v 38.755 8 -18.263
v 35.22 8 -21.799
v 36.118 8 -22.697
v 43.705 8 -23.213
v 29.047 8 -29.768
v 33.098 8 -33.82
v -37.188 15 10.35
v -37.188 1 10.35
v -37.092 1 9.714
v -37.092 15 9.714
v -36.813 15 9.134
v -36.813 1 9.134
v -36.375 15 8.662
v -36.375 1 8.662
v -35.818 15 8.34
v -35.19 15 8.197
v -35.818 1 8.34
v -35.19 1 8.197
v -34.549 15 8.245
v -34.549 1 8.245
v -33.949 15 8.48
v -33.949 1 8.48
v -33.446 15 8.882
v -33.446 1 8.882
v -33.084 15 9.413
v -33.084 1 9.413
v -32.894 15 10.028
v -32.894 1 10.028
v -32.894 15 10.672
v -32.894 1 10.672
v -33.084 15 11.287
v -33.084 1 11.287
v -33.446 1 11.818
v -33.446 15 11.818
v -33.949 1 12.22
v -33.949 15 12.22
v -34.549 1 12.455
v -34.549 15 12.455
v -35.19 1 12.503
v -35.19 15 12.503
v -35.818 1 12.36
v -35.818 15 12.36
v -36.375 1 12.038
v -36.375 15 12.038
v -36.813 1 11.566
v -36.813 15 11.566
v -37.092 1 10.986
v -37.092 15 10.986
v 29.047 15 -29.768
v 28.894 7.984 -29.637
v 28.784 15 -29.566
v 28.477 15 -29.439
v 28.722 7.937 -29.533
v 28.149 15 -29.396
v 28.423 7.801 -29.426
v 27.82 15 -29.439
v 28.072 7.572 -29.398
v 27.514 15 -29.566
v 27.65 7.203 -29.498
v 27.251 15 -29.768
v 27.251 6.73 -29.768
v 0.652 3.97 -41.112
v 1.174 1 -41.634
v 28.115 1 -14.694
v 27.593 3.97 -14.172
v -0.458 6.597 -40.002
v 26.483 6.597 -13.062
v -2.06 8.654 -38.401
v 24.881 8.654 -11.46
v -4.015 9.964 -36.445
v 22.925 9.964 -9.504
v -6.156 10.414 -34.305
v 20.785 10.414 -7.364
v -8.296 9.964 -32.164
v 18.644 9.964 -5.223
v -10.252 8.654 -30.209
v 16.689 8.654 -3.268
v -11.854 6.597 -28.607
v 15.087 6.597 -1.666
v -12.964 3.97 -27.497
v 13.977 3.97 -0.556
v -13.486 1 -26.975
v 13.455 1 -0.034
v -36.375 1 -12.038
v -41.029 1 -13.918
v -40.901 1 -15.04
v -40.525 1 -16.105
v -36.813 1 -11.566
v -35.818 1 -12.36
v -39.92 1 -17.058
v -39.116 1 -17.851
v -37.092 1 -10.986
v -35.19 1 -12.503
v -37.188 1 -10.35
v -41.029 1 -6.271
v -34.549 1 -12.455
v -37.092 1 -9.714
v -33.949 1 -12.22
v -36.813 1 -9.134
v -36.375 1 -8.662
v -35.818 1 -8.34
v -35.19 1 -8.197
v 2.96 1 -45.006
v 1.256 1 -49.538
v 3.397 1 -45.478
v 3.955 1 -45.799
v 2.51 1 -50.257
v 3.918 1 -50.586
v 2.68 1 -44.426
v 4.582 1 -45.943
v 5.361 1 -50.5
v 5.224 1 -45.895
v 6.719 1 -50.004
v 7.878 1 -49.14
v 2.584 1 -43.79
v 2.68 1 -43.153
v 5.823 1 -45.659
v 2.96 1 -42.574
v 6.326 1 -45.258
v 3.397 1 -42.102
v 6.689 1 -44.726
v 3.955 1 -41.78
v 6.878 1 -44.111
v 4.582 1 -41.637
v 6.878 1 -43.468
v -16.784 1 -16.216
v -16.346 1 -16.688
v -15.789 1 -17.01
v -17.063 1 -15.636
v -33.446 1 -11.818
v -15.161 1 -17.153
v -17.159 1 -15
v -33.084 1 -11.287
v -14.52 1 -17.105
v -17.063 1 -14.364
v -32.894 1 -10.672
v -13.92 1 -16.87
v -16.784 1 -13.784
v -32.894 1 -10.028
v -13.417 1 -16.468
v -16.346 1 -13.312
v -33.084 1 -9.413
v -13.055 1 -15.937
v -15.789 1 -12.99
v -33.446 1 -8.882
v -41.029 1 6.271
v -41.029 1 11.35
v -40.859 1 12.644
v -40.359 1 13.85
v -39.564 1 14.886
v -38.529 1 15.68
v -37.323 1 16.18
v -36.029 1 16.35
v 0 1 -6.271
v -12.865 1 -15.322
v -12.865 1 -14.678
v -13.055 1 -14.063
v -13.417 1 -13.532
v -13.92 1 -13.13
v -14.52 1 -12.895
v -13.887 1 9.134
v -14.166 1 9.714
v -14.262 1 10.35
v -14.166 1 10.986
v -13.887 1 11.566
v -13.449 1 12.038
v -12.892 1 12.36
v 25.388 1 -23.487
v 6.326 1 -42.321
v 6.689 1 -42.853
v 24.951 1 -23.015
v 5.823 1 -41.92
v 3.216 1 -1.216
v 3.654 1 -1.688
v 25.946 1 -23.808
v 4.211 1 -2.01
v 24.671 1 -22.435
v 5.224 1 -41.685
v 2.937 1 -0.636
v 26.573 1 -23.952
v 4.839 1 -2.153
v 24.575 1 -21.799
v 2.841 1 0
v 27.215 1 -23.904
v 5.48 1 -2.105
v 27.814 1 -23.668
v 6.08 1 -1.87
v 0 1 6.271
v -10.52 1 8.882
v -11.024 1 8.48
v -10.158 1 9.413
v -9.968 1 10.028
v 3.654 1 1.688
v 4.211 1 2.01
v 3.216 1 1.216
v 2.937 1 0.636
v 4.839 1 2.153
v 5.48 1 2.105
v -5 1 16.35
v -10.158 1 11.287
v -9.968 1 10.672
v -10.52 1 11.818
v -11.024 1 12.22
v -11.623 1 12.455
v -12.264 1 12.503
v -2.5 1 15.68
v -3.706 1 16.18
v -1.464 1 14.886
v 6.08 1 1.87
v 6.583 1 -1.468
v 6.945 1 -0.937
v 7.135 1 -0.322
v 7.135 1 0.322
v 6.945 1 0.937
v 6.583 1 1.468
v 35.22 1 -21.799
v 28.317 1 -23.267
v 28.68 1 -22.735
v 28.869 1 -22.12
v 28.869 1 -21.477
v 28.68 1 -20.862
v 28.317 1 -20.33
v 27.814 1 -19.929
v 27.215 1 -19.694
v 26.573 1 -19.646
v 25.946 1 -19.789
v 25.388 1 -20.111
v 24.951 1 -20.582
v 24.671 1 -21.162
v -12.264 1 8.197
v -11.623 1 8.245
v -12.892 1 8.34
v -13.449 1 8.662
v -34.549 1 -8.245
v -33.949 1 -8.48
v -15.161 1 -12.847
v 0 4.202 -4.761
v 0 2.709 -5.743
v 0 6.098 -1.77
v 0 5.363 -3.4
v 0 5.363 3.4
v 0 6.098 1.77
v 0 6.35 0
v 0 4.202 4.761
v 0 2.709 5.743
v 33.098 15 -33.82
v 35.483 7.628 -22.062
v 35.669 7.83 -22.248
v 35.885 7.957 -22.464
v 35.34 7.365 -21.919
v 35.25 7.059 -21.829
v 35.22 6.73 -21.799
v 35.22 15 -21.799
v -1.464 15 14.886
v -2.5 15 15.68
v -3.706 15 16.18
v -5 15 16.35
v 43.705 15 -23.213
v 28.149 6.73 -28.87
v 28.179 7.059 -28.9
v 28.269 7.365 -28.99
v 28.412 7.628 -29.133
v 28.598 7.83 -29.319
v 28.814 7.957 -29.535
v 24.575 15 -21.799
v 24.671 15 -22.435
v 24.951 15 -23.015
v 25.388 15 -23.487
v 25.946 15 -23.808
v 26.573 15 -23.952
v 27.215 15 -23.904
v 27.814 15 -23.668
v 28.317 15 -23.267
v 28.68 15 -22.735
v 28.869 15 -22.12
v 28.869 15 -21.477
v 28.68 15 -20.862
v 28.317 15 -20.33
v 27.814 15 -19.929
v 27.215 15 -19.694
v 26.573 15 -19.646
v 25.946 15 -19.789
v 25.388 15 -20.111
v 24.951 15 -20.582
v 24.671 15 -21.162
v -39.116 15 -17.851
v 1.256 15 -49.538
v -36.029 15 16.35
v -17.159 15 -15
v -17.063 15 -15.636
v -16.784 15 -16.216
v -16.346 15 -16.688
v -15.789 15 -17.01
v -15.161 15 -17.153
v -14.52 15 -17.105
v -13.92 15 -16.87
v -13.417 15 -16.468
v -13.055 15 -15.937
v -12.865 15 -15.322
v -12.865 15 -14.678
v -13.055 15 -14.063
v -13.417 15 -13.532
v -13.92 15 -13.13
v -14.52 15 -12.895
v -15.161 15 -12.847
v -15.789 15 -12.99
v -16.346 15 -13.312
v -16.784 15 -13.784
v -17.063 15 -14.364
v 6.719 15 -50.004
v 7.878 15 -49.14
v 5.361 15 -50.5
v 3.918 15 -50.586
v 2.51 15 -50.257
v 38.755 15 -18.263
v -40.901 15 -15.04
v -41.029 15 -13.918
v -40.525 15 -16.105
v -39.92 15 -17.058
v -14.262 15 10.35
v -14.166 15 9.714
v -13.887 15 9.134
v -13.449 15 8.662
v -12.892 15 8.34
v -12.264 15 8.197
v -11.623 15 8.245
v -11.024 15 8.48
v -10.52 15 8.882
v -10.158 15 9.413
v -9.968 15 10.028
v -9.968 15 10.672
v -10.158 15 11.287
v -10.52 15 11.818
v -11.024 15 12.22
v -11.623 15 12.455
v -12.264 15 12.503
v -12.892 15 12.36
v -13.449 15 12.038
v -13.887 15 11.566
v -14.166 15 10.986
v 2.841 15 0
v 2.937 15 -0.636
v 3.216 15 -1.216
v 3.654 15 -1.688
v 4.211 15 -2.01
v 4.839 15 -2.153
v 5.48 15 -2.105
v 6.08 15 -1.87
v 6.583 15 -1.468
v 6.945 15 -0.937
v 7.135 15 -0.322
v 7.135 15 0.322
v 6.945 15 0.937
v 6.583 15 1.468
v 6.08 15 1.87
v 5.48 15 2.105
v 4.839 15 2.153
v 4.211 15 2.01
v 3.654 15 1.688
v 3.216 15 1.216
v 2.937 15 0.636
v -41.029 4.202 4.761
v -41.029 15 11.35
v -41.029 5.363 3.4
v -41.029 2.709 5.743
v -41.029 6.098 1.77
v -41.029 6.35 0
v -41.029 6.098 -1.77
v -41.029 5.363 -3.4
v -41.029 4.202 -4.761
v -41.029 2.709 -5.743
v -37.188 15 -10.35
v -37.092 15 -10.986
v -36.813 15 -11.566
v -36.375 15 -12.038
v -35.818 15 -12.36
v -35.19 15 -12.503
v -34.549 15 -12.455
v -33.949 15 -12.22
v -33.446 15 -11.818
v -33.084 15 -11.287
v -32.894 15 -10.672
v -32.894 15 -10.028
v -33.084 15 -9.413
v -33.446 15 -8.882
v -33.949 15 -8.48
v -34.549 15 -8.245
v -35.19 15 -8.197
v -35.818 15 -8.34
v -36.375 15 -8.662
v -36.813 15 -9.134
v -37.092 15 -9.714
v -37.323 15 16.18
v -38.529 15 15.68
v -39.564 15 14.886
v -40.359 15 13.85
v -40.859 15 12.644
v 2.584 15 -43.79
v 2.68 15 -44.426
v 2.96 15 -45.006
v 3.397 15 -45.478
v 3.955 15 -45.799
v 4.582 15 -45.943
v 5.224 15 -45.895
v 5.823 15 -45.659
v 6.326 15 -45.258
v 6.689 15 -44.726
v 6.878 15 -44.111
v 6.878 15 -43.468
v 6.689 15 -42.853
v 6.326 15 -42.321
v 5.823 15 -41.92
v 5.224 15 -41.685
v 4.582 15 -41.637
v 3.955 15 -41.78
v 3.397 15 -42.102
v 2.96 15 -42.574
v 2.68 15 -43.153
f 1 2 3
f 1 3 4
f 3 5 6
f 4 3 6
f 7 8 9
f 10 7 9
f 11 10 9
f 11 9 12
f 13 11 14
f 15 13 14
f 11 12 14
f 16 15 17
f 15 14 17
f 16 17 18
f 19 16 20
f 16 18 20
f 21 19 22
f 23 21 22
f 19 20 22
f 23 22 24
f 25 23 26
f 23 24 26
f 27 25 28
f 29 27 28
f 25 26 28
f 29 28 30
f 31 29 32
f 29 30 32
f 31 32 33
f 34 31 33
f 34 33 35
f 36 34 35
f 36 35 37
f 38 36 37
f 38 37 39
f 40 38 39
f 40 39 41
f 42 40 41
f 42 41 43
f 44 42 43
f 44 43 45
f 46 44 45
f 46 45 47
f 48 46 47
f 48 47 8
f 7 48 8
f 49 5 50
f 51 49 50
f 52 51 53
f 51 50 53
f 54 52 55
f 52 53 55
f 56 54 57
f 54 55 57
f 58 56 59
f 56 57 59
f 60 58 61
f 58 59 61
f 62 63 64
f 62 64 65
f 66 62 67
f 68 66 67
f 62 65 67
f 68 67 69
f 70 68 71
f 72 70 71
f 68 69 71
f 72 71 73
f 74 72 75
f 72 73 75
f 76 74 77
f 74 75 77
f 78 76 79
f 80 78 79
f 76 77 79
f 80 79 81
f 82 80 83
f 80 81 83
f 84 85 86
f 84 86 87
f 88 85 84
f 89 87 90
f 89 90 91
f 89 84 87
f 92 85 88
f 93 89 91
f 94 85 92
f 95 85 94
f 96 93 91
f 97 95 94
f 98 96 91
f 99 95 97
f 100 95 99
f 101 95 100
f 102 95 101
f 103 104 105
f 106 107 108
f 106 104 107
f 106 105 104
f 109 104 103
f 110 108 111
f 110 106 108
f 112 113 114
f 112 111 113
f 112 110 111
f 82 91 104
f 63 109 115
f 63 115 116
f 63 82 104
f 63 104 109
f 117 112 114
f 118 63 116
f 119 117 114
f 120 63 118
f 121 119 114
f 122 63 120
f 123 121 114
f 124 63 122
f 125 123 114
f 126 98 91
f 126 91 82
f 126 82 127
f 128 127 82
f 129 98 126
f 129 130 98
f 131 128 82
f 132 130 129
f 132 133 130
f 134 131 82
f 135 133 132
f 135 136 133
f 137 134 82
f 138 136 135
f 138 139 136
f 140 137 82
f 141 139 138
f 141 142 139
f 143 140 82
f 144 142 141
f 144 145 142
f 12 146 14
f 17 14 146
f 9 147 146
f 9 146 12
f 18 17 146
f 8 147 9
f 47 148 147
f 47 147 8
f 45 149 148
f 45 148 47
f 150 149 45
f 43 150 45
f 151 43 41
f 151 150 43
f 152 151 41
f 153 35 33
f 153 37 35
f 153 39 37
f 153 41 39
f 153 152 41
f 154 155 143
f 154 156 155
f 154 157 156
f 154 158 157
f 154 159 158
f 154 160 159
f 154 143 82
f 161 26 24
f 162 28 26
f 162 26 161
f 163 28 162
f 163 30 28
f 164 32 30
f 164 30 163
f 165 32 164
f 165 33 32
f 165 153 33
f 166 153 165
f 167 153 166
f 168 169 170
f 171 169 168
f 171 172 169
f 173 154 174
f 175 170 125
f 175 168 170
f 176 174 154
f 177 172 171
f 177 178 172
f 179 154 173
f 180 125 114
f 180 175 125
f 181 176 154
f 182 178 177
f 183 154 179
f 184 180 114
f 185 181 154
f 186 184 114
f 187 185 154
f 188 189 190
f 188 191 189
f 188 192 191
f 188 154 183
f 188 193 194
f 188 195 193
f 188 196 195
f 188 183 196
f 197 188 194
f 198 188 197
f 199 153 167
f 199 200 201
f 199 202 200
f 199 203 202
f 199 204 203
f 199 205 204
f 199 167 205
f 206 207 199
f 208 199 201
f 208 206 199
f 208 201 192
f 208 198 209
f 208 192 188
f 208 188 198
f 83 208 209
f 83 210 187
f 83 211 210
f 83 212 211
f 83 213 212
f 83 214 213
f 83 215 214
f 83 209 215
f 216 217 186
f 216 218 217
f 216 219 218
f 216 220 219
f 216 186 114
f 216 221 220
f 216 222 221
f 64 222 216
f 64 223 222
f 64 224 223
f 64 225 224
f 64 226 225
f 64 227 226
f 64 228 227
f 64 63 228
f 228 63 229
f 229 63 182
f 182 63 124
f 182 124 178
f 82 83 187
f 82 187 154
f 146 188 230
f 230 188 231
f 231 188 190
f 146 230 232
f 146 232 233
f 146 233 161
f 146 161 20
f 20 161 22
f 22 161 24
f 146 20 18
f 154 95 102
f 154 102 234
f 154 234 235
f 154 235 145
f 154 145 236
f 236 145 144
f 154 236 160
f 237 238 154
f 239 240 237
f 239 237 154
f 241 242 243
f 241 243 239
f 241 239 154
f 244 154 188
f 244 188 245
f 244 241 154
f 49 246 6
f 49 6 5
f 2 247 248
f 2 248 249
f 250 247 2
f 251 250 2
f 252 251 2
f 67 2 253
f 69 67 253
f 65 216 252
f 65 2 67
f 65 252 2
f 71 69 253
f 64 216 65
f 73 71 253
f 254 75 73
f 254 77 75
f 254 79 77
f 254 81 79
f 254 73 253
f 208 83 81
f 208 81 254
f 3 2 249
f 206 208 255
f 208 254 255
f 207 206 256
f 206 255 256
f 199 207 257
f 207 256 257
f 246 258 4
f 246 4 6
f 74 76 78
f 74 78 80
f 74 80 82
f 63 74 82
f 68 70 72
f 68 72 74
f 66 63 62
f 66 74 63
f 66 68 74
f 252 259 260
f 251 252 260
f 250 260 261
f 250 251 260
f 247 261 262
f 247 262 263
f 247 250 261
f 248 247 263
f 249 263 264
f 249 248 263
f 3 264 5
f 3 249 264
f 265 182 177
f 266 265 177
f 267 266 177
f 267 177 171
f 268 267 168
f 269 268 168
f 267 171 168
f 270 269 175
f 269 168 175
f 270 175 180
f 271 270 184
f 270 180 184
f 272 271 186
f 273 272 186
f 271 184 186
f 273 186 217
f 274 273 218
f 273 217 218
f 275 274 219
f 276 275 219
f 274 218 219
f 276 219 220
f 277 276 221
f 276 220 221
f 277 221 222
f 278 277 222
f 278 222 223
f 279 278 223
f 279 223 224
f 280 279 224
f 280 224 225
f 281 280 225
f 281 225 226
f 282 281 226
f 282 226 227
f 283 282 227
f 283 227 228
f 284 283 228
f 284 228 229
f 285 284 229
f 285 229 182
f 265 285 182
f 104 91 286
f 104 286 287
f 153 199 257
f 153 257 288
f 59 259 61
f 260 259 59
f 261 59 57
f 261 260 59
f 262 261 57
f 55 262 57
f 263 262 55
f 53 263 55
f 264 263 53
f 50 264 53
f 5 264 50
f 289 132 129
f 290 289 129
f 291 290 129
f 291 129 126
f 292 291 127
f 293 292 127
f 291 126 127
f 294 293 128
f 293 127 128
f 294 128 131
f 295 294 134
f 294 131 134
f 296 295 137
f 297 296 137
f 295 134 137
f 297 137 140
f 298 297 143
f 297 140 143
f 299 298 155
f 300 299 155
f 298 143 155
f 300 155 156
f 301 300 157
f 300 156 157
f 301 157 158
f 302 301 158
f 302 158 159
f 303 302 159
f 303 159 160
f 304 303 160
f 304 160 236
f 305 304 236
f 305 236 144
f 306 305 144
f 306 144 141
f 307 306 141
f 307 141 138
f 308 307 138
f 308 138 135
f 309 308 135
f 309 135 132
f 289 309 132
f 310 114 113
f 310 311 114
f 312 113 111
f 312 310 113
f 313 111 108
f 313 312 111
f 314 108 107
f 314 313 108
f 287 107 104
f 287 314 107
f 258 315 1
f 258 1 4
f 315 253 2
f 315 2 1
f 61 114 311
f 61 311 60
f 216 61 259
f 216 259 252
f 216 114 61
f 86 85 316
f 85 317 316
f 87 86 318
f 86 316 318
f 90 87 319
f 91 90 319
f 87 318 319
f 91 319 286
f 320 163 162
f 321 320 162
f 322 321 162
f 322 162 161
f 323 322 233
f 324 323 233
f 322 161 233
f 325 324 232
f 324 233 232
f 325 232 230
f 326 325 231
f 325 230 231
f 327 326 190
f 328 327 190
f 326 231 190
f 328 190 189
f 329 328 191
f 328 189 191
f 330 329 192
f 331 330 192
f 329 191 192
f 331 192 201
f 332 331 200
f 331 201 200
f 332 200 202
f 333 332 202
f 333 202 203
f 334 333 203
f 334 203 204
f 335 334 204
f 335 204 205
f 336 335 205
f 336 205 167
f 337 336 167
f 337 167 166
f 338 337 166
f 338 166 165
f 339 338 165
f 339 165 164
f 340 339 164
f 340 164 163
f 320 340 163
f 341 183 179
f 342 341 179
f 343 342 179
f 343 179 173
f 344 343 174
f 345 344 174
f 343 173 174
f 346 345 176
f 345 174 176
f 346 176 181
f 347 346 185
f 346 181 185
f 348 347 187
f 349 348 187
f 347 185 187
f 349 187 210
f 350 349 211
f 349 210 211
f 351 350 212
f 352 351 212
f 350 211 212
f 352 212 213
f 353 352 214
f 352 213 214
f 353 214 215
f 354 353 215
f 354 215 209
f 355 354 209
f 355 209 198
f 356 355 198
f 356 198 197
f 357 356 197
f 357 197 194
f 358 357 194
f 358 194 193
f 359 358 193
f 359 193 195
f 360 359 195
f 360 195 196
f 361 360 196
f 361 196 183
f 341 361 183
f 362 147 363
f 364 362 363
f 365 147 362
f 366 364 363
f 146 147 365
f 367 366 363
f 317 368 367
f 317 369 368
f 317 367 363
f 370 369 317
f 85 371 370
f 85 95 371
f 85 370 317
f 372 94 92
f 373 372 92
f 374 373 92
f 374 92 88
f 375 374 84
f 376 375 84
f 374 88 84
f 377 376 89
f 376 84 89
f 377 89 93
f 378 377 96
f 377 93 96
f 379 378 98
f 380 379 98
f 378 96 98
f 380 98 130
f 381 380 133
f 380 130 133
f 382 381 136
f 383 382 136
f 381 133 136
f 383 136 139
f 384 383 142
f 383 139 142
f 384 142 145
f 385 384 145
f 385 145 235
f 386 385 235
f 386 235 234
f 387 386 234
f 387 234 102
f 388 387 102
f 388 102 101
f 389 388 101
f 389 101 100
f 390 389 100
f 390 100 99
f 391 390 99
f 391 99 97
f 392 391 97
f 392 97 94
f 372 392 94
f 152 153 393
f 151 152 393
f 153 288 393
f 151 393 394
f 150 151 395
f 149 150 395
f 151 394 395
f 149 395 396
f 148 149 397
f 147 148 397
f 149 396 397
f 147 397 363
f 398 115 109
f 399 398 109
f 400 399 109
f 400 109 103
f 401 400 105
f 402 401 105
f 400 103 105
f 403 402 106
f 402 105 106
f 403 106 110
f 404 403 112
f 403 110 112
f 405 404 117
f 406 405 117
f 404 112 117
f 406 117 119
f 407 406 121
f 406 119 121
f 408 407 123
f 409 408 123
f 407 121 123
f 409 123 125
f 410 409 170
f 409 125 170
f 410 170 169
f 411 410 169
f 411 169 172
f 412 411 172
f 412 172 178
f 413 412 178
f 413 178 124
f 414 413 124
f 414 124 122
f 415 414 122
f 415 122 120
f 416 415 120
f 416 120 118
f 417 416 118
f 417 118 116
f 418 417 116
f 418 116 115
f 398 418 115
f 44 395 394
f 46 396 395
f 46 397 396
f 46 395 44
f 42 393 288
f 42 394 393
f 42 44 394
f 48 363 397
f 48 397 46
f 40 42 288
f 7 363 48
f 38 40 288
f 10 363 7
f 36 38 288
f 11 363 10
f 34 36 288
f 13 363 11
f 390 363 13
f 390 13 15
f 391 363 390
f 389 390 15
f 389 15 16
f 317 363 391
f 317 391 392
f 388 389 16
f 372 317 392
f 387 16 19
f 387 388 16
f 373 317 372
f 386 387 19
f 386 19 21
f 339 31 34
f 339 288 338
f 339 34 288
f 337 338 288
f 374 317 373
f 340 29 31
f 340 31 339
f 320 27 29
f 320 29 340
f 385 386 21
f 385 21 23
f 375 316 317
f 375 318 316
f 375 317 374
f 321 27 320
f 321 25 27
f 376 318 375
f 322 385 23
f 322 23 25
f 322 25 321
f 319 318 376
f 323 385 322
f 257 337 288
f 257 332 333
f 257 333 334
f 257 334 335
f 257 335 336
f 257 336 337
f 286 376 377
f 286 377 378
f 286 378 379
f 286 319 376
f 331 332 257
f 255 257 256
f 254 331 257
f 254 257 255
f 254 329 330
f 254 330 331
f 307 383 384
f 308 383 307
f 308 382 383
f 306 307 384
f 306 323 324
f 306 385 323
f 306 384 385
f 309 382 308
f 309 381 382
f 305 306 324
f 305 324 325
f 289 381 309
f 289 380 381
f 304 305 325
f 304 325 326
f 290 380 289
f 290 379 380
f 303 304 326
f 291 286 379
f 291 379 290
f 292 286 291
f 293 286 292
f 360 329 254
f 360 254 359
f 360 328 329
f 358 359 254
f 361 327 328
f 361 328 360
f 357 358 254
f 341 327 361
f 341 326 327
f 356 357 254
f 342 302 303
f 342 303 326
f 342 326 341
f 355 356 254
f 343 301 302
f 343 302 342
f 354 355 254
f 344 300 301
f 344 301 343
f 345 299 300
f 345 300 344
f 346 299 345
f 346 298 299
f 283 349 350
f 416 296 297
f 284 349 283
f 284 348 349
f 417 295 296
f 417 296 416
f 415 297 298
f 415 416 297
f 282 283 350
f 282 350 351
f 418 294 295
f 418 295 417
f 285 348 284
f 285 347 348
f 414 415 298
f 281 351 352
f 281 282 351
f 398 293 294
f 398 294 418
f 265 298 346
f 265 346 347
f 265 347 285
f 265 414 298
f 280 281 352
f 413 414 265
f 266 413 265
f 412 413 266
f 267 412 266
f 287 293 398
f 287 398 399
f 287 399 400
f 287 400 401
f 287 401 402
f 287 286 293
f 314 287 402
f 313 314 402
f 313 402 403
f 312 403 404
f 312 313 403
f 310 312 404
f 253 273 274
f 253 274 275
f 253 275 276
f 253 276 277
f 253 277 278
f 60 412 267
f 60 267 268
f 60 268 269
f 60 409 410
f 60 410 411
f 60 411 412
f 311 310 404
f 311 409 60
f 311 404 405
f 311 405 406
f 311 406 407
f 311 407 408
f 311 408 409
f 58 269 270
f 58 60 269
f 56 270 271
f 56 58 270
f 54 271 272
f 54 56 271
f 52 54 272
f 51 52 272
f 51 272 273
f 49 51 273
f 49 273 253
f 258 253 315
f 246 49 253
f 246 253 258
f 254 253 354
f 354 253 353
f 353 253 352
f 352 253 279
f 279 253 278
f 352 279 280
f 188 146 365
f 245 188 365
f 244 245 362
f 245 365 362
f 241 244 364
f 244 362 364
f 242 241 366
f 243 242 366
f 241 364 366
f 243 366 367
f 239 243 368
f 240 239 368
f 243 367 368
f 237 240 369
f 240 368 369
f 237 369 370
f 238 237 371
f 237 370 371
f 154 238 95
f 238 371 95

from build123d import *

# Parameters (mm, degrees)
EXTRUDE_1_DEPTH        = 14
EXTRUDE_2_DEPTH        = 7
CUT_EXTRUDE_1_DEPTH    = 38.1
CUT_EXTRUDE_2_DEPTH    = 41.028932188
HOLE_WIZARD_M4_1_D     = 4.318
HOLE_WIZARD_M4_1_DEPTH = 14
FILLET_1_R             = 5
FILLET_3_R             = 1.27
FILLET_4_R             = 1.27


with BuildPart() as part:
    # 草图1 → 凸台-拉伸1 (new body)
    with BuildSketch(Plane.XZ.offset(-1)):
        Polygon((4.743453393, -52.27499012), (35.219755662, -21.79868785), (-2.928932188, 16.35), (-41.028932188, 16.35), (-41.028932188, -16.35), align=None)
    extrude(amount=-EXTRUDE_1_DEPTH)

    # 草图2 → 凸台-拉伸2 (add)
    with BuildSketch(Plane(origin=(0, 15, 0), x_dir=(1, 0, 0), z_dir=(0, 1, 0))):
        Polygon((35.219755662, 21.79868785), (38.755289568, 18.263153944), (43.705037037, 23.212901413), (33.098435319, 33.819503131), (28.14868785, 28.869755662), align=None)
    extrude(amount=-EXTRUDE_2_DEPTH)

    # 草图3 → 切除-拉伸1 (cut)
    with BuildSketch(Plane(origin=(6.710533906, 0, 6.710533906), x_dir=(0.707106781, 0, -0.707106781), z_dir=(0.707106781, 0, 0.707106781))):
        with BuildLine():
            Line((9.538251542, 1), (30.270004579, 1))
            ThreePointArc((30.270004579, 1), (19.904128061, 10.414), (9.538251542, 1))
        make_face()
    extrude(amount=-CUT_EXTRUDE_1_DEPTH, mode=Mode.SUBTRACT)

    # 草图4 → 切除-拉伸2 (cut)
    with BuildSketch(Plane.ZY.offset(41.028932188)):
        with BuildLine():
            Line((-6.270765504, 1), (6.270765504, 1))
            ThreePointArc((6.270765504, 1), (0, 6.35), (-6.270765504, 1))
        make_face()
    extrude(amount=-CUT_EXTRUDE_2_DEPTH, mode=Mode.SUBTRACT)

    # M4 间隙孔1
    with Locations(Plane(origin=(0, 15, 0), x_dir=(1, 0, 0), z_dir=(0, 1, 0))):
        with Locations((-35.028932188, -10.35), (5, 0), (-15, 15), (-12.103043109, -10.35), (-35.028932188, 10.35), (4.743453393, 43.789708745), (26.734474288, 21.79868785)):
            Hole(HOLE_WIZARD_M4_1_D / 2, depth=HOLE_WIZARD_M4_1_DEPTH)

    # 圆角1
    fillet_1_edges = [part.edges().sort_by_distance(p)[0] for p in [
        (-41.028932188, 8, -16.35),
        (-41.028932188, 8, 16.35),
        (-2.928932188, 8, 16.35),
        (4.743453393, 8, -52.27499012),
    ]]
    fillet(fillet_1_edges, radius=FILLET_1_R)

    # 圆角3
    fillet_3_edges = [part.edges().sort_by_distance(p)[0] for p in [
        (28.14868785, 11.5, -28.869755662),
    ]]
    fillet(fillet_3_edges, radius=FILLET_3_R)

    # 圆角4
    fillet_4_edges = [part.edges().sort_by_distance(p)[0] for p in [
        (31.684221756, 8, -25.334221756),
    ]]
    fillet(fillet_4_edges, radius=FILLET_4_R)


solid = part.part
